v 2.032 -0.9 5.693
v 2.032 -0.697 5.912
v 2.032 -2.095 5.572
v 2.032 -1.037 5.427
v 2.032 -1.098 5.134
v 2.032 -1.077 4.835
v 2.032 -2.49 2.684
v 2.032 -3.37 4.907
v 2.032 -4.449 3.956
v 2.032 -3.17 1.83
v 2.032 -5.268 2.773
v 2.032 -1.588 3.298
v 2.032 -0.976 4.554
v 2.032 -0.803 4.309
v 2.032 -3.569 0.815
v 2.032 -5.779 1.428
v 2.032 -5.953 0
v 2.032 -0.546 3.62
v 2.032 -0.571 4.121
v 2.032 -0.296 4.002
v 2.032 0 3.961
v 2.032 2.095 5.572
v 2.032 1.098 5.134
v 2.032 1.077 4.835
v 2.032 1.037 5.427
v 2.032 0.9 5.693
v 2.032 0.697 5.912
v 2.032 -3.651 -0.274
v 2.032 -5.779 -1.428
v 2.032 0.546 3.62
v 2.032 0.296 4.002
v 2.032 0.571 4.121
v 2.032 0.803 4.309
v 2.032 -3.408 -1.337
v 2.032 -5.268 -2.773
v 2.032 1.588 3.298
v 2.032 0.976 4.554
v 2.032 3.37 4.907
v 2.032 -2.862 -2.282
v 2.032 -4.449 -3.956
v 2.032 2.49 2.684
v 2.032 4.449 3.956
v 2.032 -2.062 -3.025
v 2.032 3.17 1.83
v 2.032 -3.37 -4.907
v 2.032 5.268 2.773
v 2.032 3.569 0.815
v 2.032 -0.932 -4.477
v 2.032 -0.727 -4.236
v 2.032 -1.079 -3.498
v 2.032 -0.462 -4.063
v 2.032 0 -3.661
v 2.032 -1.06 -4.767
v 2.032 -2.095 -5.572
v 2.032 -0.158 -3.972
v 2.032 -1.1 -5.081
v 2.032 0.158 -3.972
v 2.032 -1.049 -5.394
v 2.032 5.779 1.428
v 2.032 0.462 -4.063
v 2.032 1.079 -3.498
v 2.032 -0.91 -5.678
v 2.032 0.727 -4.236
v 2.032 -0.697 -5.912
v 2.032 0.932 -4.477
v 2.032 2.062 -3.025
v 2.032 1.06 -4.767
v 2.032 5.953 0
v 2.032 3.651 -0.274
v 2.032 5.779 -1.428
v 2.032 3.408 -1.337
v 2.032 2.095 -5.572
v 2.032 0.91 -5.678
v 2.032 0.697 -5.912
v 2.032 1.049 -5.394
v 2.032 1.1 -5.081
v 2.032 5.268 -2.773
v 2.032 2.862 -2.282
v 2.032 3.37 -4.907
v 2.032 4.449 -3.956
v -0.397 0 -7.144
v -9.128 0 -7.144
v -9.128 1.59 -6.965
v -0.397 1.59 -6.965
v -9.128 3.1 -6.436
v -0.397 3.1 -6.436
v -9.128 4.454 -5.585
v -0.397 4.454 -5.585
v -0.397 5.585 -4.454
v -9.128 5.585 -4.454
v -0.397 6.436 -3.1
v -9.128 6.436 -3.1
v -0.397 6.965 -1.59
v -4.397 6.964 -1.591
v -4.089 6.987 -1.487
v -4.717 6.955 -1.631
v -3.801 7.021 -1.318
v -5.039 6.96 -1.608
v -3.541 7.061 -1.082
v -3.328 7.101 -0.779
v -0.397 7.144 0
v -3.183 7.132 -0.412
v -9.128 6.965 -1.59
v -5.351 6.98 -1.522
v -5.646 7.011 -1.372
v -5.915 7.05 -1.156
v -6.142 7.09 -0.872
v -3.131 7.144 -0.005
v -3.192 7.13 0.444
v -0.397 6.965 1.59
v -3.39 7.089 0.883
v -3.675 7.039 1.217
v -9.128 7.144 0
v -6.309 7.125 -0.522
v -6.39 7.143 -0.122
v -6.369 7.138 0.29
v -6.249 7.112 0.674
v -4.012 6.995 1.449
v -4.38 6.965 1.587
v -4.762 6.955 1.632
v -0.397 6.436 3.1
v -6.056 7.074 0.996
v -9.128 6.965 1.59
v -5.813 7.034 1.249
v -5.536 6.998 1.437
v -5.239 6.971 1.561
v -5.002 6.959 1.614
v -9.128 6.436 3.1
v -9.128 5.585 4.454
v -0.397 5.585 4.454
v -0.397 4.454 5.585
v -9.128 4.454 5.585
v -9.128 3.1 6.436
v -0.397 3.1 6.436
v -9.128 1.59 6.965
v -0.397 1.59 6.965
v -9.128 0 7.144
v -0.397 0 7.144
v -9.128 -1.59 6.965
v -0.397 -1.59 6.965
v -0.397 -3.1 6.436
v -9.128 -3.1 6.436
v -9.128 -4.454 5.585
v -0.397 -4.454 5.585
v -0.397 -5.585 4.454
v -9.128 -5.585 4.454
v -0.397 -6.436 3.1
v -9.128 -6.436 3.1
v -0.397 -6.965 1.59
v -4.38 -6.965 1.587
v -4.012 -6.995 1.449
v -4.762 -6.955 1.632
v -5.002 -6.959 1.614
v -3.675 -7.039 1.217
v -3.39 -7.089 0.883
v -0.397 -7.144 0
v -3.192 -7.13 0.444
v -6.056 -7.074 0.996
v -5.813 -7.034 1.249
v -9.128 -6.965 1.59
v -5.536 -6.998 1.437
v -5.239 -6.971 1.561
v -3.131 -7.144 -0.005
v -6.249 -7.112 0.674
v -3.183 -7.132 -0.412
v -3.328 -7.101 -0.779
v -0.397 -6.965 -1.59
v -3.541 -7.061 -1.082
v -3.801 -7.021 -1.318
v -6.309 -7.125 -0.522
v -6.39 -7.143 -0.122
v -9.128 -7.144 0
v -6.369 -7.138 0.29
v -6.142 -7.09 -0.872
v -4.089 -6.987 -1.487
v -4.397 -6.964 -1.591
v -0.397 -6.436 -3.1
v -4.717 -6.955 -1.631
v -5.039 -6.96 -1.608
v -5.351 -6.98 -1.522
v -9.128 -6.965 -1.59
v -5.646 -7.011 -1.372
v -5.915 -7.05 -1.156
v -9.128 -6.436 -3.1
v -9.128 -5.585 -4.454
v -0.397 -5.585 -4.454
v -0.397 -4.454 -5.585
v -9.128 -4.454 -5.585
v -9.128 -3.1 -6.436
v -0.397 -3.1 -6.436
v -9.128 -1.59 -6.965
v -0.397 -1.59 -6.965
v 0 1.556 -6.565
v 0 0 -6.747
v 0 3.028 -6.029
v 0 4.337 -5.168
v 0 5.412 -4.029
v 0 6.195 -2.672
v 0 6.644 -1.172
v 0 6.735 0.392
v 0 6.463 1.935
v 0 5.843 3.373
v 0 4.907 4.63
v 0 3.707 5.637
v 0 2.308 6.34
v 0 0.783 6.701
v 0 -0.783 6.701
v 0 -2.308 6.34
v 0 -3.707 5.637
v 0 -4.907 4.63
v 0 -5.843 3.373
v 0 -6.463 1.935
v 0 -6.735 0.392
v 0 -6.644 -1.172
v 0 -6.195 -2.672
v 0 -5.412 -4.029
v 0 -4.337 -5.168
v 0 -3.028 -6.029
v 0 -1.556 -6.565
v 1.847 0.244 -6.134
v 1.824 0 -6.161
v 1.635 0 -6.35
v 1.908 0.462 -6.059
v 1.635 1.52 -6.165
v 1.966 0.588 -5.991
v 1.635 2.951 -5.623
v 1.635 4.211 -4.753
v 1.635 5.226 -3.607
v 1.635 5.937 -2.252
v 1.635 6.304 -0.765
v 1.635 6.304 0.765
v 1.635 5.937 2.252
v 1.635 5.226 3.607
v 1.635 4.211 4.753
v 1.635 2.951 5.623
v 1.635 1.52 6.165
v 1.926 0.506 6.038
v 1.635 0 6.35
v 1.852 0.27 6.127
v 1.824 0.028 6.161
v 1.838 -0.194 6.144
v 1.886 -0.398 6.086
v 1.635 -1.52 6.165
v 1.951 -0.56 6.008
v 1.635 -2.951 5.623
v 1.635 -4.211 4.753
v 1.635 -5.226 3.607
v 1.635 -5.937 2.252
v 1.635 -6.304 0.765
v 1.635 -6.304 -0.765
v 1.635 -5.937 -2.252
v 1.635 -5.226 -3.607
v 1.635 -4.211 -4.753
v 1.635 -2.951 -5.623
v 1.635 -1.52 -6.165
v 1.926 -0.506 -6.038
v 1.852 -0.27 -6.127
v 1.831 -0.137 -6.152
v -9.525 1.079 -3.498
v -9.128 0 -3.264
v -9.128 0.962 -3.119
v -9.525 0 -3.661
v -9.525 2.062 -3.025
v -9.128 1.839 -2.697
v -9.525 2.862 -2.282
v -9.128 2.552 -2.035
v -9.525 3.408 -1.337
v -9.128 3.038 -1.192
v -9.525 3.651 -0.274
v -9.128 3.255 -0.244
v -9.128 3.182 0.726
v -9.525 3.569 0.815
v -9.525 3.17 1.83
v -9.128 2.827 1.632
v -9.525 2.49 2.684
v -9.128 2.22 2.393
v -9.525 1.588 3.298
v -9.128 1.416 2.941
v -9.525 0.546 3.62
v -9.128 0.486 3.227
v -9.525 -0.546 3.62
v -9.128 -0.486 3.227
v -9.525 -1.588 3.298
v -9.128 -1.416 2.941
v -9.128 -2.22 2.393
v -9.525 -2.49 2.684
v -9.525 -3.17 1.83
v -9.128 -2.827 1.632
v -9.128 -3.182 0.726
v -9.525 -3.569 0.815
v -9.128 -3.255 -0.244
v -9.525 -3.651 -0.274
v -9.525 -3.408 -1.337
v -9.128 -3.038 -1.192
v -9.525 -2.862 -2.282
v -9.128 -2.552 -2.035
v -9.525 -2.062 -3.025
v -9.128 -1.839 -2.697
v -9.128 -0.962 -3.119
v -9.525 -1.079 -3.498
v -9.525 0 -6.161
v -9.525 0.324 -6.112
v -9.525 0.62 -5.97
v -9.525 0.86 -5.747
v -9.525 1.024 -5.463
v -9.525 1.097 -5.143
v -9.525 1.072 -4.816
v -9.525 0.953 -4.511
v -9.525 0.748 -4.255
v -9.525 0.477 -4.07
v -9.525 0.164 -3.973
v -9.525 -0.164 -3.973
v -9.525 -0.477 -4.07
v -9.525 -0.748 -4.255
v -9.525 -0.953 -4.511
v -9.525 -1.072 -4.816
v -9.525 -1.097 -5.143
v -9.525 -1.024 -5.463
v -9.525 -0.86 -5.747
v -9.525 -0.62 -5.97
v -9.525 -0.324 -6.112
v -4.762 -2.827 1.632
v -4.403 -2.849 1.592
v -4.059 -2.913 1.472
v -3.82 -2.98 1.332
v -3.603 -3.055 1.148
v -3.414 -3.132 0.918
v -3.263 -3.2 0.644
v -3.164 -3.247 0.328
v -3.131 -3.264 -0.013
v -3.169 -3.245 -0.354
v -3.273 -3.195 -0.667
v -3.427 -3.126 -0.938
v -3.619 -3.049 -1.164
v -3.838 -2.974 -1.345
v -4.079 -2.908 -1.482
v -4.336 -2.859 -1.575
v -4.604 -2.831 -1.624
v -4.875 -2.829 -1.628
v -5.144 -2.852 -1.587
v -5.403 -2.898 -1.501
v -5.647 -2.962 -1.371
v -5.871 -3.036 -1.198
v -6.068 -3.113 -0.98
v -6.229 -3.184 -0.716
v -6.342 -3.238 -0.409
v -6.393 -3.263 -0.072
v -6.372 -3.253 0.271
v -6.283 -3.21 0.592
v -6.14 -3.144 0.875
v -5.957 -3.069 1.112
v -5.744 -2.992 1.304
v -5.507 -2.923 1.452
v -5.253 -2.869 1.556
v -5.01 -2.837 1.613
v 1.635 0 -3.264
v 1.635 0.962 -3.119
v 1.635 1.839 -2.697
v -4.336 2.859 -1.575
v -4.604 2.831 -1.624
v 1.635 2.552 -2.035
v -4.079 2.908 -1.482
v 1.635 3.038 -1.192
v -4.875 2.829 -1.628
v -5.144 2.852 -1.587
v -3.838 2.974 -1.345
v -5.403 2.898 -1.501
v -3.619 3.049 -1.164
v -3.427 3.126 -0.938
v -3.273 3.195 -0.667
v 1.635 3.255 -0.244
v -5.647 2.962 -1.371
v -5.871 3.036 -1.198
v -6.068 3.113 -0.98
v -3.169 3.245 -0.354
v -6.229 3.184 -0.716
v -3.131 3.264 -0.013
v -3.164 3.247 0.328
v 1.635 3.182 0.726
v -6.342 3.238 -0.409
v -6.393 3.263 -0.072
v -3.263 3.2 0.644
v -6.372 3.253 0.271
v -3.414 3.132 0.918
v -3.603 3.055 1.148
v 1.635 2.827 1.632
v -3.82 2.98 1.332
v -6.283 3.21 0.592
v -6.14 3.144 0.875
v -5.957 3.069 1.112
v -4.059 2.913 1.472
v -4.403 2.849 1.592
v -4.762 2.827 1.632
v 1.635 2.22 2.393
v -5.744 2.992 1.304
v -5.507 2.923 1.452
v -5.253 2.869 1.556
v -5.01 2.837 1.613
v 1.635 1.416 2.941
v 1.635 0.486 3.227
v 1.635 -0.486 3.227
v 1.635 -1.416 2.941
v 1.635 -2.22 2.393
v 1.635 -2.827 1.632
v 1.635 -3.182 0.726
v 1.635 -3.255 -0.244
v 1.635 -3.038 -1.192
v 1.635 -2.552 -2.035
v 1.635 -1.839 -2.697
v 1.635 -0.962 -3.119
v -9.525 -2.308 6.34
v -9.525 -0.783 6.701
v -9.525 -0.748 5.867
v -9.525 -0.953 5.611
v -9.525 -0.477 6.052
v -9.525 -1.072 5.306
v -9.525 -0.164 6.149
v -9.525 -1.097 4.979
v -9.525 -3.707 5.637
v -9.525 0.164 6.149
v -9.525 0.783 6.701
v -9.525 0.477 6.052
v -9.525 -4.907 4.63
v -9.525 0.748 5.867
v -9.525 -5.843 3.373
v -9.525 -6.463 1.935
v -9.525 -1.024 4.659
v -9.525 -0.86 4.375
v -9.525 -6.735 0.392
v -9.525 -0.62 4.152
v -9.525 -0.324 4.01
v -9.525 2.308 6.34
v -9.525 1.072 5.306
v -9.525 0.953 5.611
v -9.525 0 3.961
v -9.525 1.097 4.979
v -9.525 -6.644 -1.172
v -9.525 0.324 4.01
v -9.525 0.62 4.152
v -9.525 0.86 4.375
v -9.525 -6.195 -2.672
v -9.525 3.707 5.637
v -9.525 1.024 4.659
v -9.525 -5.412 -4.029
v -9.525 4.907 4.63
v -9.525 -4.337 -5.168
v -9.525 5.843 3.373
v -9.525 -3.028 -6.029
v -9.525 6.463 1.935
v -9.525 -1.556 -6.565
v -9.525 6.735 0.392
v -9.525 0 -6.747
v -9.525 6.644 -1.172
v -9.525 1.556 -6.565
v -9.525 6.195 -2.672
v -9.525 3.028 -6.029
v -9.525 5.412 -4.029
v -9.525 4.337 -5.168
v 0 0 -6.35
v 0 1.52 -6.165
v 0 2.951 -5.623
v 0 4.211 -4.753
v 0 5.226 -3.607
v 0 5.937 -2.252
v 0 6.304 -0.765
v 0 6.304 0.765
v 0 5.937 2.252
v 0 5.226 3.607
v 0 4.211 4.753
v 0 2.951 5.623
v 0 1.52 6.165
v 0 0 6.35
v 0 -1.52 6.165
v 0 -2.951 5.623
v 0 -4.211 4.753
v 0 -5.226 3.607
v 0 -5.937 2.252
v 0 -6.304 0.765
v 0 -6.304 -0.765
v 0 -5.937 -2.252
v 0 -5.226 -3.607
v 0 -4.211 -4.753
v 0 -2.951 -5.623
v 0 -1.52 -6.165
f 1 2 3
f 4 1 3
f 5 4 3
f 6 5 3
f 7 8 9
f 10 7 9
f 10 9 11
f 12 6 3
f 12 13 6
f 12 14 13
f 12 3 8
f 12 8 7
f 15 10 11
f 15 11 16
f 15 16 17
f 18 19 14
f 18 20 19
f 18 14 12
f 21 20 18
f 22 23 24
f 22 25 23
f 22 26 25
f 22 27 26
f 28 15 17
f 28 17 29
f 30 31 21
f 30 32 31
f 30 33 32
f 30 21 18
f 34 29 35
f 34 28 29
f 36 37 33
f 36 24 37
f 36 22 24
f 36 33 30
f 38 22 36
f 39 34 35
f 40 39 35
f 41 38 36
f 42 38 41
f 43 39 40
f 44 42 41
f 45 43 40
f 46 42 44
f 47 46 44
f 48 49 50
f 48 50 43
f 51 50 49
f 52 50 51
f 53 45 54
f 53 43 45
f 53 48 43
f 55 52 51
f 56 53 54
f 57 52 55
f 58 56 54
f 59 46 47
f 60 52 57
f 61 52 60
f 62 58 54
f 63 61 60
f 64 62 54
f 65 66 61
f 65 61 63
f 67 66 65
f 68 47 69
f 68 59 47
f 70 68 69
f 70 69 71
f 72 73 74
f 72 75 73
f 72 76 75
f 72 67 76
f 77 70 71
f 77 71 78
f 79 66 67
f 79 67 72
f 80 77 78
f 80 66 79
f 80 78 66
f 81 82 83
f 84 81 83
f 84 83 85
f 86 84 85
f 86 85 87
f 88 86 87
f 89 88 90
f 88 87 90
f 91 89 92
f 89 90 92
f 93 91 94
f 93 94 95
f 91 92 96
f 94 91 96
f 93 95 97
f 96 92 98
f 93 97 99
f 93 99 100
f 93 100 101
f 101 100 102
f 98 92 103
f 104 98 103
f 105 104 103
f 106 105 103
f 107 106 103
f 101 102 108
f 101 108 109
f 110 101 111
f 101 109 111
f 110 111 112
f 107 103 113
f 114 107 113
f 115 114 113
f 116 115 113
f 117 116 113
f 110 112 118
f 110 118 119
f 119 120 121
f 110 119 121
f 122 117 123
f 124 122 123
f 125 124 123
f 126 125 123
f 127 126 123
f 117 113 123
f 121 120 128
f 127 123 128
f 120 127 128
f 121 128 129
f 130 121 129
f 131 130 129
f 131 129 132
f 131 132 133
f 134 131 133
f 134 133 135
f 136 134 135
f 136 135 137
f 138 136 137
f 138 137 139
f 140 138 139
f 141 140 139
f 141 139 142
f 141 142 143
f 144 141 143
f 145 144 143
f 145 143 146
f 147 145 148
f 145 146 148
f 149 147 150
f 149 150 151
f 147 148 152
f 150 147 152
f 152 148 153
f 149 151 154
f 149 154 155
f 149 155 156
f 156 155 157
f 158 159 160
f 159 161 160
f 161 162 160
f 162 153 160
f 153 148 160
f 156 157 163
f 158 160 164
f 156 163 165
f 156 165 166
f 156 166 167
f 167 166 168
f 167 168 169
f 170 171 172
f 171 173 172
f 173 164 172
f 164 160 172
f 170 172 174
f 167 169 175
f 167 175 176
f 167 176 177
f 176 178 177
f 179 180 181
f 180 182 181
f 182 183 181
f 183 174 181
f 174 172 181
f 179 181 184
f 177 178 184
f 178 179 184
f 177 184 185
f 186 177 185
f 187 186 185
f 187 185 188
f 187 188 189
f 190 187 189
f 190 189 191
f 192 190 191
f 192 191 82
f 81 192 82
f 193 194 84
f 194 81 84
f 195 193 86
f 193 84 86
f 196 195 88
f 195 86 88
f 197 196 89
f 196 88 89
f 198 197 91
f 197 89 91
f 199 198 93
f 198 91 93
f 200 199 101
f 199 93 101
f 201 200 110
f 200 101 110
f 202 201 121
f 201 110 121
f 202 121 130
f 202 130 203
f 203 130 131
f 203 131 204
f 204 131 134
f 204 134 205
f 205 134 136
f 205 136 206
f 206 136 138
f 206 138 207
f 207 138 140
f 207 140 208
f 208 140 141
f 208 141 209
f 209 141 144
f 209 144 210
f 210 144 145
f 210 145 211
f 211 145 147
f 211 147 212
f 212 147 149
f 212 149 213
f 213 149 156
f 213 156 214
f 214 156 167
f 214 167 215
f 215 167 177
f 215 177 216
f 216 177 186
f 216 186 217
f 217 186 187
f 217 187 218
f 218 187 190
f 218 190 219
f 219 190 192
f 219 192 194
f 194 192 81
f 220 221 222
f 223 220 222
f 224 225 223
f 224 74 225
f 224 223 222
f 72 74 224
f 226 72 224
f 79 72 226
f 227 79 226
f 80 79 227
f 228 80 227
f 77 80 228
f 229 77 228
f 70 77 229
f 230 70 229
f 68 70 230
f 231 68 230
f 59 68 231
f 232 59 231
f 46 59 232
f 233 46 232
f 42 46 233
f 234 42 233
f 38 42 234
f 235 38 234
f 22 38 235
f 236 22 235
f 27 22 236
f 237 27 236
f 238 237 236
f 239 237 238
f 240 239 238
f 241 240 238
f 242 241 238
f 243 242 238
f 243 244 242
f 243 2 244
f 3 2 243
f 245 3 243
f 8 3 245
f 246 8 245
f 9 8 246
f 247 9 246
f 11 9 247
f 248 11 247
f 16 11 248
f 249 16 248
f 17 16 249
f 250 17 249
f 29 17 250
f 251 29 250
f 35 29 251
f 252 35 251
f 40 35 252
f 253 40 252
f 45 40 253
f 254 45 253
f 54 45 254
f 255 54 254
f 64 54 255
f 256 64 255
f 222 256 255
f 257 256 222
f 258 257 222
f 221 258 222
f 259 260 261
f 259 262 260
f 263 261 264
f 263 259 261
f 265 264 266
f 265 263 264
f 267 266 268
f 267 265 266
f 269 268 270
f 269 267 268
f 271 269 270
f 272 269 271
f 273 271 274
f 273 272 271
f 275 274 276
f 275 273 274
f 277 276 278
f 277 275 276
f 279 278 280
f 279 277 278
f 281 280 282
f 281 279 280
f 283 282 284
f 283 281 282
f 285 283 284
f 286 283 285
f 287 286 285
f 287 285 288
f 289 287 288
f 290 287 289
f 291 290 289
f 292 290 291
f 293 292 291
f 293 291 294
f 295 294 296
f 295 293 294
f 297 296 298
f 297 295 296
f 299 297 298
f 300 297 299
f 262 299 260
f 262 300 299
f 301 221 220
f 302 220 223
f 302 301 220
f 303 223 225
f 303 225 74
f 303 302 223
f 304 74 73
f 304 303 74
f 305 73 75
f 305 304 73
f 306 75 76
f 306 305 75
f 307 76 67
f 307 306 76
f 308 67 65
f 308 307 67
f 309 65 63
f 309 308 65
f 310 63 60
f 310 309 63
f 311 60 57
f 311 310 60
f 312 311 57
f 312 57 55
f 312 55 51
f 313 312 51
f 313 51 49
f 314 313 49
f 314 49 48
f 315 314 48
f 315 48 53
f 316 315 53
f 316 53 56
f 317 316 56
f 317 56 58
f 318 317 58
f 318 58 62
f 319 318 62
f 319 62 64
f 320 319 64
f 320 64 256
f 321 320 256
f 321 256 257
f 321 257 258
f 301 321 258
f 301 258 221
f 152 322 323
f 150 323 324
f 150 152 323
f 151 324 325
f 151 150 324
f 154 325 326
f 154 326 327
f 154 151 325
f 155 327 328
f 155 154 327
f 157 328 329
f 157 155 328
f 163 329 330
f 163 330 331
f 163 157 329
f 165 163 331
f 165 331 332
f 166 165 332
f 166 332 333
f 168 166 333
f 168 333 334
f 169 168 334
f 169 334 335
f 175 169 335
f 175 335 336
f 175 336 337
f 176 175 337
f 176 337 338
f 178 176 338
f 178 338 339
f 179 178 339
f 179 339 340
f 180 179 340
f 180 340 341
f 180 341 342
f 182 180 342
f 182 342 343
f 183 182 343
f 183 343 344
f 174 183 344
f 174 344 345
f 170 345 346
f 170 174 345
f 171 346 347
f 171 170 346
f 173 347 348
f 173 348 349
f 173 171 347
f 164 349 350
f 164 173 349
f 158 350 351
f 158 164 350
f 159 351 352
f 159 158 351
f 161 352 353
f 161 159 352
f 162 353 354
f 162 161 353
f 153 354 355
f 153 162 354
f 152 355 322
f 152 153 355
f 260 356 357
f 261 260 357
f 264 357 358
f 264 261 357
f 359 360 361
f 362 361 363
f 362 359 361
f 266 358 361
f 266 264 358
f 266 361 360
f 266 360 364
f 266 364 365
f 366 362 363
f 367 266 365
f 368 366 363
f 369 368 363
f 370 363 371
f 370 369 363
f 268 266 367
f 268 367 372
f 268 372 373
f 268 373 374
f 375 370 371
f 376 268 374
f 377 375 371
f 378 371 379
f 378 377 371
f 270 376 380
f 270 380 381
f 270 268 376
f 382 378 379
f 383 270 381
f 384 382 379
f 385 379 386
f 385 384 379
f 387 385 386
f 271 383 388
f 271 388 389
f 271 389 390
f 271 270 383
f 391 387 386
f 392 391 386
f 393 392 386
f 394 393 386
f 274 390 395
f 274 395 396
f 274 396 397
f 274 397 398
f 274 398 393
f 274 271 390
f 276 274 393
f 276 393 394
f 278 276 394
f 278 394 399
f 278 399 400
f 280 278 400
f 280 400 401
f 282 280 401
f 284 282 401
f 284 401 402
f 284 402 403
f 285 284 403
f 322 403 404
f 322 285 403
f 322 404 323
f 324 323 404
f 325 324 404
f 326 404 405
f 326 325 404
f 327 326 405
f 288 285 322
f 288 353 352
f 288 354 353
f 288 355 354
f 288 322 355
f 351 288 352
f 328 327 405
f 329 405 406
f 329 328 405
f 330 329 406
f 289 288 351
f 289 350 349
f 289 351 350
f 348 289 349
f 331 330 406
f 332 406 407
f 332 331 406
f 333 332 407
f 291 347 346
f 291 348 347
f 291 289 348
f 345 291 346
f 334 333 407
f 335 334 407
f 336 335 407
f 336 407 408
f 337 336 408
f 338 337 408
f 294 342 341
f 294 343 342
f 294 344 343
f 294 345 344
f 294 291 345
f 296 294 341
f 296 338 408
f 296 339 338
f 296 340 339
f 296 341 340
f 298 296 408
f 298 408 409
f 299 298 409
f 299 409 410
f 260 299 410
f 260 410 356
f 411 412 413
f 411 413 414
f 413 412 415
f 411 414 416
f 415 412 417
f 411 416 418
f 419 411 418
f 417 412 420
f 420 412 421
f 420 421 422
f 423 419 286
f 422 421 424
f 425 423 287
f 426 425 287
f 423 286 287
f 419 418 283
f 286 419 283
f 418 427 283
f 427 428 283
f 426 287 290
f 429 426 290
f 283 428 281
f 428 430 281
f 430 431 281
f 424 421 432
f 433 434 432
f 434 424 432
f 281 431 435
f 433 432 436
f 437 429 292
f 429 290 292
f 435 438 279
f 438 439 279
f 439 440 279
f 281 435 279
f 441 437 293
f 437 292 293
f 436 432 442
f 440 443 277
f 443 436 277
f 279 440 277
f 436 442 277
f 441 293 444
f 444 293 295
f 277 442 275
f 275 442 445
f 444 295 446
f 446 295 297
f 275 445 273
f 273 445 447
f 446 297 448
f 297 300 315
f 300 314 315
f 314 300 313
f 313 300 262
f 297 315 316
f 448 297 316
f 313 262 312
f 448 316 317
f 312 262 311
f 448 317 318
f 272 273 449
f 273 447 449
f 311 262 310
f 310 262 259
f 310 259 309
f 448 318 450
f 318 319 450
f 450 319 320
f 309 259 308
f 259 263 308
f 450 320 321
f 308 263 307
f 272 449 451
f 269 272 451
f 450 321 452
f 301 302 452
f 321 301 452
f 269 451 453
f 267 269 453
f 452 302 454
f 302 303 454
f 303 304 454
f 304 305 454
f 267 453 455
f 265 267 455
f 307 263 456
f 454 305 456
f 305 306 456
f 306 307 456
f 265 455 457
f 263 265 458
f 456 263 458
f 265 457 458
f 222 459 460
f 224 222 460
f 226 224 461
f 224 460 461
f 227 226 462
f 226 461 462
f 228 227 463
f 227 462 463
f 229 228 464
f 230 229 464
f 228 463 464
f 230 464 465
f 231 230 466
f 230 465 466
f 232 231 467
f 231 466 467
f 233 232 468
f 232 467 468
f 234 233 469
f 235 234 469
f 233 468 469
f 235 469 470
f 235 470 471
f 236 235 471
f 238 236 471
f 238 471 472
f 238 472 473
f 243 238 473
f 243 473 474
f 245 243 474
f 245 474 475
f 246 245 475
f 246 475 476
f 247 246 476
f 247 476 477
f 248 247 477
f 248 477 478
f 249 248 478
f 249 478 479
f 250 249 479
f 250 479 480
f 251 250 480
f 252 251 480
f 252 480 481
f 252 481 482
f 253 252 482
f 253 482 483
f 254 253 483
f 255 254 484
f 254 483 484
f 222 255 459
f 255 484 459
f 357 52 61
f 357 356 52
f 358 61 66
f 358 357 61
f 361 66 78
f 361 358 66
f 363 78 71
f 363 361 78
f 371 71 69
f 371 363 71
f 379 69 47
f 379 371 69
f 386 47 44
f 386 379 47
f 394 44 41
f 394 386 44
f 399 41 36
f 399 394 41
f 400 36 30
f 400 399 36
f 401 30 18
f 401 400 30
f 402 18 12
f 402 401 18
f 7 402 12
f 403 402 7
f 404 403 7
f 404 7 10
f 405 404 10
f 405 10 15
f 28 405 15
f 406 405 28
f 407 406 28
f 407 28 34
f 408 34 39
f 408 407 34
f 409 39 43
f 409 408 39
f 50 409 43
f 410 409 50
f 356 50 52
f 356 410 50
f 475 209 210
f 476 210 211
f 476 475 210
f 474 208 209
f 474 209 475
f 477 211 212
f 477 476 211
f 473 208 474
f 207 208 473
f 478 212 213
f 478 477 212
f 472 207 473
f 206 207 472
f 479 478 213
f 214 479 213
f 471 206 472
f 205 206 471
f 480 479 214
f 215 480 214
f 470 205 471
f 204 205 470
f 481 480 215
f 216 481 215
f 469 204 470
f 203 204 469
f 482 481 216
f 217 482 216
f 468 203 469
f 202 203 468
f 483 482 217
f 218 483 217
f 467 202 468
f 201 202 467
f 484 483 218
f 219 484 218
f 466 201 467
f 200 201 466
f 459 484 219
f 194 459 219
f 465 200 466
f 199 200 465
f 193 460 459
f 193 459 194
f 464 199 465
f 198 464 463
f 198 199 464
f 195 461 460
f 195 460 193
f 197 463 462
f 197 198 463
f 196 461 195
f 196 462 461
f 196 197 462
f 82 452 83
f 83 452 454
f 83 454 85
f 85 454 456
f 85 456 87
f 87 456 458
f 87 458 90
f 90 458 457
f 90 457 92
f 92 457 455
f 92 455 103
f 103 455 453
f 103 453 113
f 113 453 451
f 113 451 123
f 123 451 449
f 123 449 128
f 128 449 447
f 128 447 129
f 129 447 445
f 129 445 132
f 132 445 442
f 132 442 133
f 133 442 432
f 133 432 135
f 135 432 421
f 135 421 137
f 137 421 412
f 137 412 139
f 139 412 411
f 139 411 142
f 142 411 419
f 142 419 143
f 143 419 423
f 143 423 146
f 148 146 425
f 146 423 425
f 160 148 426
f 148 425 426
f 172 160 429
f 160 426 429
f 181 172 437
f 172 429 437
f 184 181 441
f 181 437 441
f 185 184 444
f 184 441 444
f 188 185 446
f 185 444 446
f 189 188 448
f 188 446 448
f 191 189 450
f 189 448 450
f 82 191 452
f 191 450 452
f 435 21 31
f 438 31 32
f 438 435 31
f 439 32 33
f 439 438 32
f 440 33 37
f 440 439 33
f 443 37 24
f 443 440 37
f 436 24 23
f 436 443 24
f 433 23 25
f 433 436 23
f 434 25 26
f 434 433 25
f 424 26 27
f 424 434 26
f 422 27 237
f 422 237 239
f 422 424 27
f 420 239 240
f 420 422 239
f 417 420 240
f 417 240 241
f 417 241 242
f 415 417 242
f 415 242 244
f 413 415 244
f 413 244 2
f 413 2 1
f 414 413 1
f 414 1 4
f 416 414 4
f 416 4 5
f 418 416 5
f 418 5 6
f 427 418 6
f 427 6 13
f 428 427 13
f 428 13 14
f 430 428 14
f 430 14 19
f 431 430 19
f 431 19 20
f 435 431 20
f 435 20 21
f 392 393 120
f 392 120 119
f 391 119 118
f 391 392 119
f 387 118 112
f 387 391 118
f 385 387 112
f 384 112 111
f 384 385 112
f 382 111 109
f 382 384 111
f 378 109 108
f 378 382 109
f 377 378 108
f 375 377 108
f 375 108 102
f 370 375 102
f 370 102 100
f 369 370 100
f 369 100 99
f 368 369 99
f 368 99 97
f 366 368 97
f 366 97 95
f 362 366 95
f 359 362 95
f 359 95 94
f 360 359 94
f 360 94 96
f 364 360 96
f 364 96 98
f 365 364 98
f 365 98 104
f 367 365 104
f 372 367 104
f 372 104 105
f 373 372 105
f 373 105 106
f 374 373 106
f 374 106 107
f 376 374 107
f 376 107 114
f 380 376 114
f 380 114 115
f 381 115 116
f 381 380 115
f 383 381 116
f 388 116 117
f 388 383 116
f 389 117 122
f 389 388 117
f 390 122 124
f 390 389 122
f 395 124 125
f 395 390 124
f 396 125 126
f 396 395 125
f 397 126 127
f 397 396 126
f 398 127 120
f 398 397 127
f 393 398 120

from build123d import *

# Parameters (mm, degrees)
SKETCH1_R                                 = 6.35
SKETCH1_R_2                               = 3.2639
SKETCH1_R_3                               = 1.099999959
INNER_SIDE_EXTRUDE_DEPTH                  = 2.032
OUTER_START                               = -9.525
SKETCH1_3_R                               = 7.14375
SKETCH1_3_R_2                             = 6.35
SKETCH1_3_R_3                             = 3.2639
SKETCH1_3_R_4                             = 1.099999959
OUTER_SIDE_EXTRUDE_DEPTH                  = 9.525
CLEVIS_PIN_CUT_DEPTH                      = 14.8849542
CLEVIS_PIN_CUT_DEPTH_BACK                 = 14.8849542
SKETCH2_R                                 = 1.63195
CHAMFER_SO_STEVE_DOESN_T_CUT_HIMSELF_SIZE = 0.396875


with BuildPart() as part:
    # Sketch1 → Inner Side Extrude (new body)
    with BuildSketch(Plane(origin=(0, 0, 0), x_dir=(0, 0, -1), z_dir=(1, 0, 0))):
        Circle(SKETCH1_R)
        Circle(SKETCH1_R_2, mode=Mode.SUBTRACT)
        with Locations((-5.06095, 0)):
            Circle(SKETCH1_R_3, mode=Mode.SUBTRACT)
        with Locations((5.06095, 0)):
            Circle(SKETCH1_R_3, mode=Mode.SUBTRACT)
    extrude(amount=INNER_SIDE_EXTRUDE_DEPTH)

    # Sketch1<3> → Outer Side Extrude (add)
    # profile 1 of 2: a face of its own
    with BuildSketch(Plane(origin=(0, 0, 0), x_dir=(0, 0, -1), z_dir=(1, 0, 0)).offset(OUTER_START)):
        Circle(SKETCH1_3_R)
        Circle(SKETCH1_3_R_2, mode=Mode.SUBTRACT)
    # profile 2 of 2: a face of its own
    with BuildSketch(Plane(origin=(0, 0, 0), x_dir=(0, 0, -1), z_dir=(1, 0, 0)).offset(OUTER_START)):
        Circle(SKETCH1_3_R_2)
        Circle(SKETCH1_3_R_3, mode=Mode.SUBTRACT)
        with Locations((-5.06095, 0)):
            Circle(SKETCH1_3_R_4, mode=Mode.SUBTRACT)
        with Locations((5.06095, 0)):
            Circle(SKETCH1_3_R_4, mode=Mode.SUBTRACT)
    extrude(amount=OUTER_SIDE_EXTRUDE_DEPTH)

    # Sketch2 → Clevis Pin Cut (cut, two sides: drawn at the far end of the back side and taken through both)
    with BuildSketch(Plane(origin=(0, 0, 0), x_dir=(1, 0, 0), z_dir=(0, 1, 0)).offset(-CLEVIS_PIN_CUT_DEPTH_BACK)):
        with Locations(Location((-4.7625, 0, 0), (0, 0, 270))):
            Circle(SKETCH2_R)
    extrude(amount=CLEVIS_PIN_CUT_DEPTH + CLEVIS_PIN_CUT_DEPTH_BACK, mode=Mode.SUBTRACT)

    # Chamfer so Steve Doesn't cut himself
    # the kernel refuses this chamfer: 0.396875 mm, written as the material it takes off along each edge
    with BuildSketch(Plane(origin=(2.032, 0, 0), x_dir=(0, 0, -1), z_dir=(0, -1, 0))) as chamfer_so_steve_doesn_t_cut_himself_piece_1:
        Polygon((3.2639 + CHAMFER_SO_STEVE_DOESN_T_CUT_HIMSELF_SIZE, 0), (3.2639, -CHAMFER_SO_STEVE_DOESN_T_CUT_HIMSELF_SIZE), (3.2639, 0), align=None)
    revolve(axis=Axis((2.032, 0, 0), (1, 0, 0)), mode=Mode.SUBTRACT)
    with BuildSketch(Plane(origin=(-9.525, 0, 0), x_dir=(0, 0, -1), z_dir=(0, -1, 0))) as chamfer_so_steve_doesn_t_cut_himself_piece_2:
        Polygon((7.14375, CHAMFER_SO_STEVE_DOESN_T_CUT_HIMSELF_SIZE), (7.14375 - CHAMFER_SO_STEVE_DOESN_T_CUT_HIMSELF_SIZE, 0), (7.14375, 0), align=None)
    revolve(axis=Axis((-9.525, 0, 0), (1, 0, 0)), mode=Mode.SUBTRACT)
    with BuildSketch(Plane(origin=(-9.525, 0, 0), x_dir=(0, 0, -1), z_dir=(0, -1, 0))) as chamfer_so_steve_doesn_t_cut_himself_piece_3:
        Polygon((3.2639, CHAMFER_SO_STEVE_DOESN_T_CUT_HIMSELF_SIZE), (3.2639 + CHAMFER_SO_STEVE_DOESN_T_CUT_HIMSELF_SIZE, 0), (3.2639, 0), align=None)
    revolve(axis=Axis((-9.525, 0, 0), (1, 0, 0)), mode=Mode.SUBTRACT)
    with BuildSketch(Plane(origin=(0, 0, 0), x_dir=(0, 0, -1), z_dir=(0, -1, 0))) as chamfer_so_steve_doesn_t_cut_himself_piece_4:
        Polygon((7.14375 - CHAMFER_SO_STEVE_DOESN_T_CUT_HIMSELF_SIZE, 0), (7.14375, -CHAMFER_SO_STEVE_DOESN_T_CUT_HIMSELF_SIZE), (7.14375, 0), align=None)
    revolve(axis=Axis((0, 0, 0), (1, 0, 0)), mode=Mode.SUBTRACT)
    with BuildSketch(Plane(origin=(2.032, 0, 0), x_dir=(0, 0, -1), z_dir=(0, -1, 0))) as chamfer_so_steve_doesn_t_cut_himself_piece_5:
        Polygon((6.35, -CHAMFER_SO_STEVE_DOESN_T_CUT_HIMSELF_SIZE), (6.35 - CHAMFER_SO_STEVE_DOESN_T_CUT_HIMSELF_SIZE, 0), (6.35, 0), align=None)
    revolve(axis=Axis((2.032, 0, 0), (1, 0, 0)), mode=Mode.SUBTRACT)


solid = part.part
